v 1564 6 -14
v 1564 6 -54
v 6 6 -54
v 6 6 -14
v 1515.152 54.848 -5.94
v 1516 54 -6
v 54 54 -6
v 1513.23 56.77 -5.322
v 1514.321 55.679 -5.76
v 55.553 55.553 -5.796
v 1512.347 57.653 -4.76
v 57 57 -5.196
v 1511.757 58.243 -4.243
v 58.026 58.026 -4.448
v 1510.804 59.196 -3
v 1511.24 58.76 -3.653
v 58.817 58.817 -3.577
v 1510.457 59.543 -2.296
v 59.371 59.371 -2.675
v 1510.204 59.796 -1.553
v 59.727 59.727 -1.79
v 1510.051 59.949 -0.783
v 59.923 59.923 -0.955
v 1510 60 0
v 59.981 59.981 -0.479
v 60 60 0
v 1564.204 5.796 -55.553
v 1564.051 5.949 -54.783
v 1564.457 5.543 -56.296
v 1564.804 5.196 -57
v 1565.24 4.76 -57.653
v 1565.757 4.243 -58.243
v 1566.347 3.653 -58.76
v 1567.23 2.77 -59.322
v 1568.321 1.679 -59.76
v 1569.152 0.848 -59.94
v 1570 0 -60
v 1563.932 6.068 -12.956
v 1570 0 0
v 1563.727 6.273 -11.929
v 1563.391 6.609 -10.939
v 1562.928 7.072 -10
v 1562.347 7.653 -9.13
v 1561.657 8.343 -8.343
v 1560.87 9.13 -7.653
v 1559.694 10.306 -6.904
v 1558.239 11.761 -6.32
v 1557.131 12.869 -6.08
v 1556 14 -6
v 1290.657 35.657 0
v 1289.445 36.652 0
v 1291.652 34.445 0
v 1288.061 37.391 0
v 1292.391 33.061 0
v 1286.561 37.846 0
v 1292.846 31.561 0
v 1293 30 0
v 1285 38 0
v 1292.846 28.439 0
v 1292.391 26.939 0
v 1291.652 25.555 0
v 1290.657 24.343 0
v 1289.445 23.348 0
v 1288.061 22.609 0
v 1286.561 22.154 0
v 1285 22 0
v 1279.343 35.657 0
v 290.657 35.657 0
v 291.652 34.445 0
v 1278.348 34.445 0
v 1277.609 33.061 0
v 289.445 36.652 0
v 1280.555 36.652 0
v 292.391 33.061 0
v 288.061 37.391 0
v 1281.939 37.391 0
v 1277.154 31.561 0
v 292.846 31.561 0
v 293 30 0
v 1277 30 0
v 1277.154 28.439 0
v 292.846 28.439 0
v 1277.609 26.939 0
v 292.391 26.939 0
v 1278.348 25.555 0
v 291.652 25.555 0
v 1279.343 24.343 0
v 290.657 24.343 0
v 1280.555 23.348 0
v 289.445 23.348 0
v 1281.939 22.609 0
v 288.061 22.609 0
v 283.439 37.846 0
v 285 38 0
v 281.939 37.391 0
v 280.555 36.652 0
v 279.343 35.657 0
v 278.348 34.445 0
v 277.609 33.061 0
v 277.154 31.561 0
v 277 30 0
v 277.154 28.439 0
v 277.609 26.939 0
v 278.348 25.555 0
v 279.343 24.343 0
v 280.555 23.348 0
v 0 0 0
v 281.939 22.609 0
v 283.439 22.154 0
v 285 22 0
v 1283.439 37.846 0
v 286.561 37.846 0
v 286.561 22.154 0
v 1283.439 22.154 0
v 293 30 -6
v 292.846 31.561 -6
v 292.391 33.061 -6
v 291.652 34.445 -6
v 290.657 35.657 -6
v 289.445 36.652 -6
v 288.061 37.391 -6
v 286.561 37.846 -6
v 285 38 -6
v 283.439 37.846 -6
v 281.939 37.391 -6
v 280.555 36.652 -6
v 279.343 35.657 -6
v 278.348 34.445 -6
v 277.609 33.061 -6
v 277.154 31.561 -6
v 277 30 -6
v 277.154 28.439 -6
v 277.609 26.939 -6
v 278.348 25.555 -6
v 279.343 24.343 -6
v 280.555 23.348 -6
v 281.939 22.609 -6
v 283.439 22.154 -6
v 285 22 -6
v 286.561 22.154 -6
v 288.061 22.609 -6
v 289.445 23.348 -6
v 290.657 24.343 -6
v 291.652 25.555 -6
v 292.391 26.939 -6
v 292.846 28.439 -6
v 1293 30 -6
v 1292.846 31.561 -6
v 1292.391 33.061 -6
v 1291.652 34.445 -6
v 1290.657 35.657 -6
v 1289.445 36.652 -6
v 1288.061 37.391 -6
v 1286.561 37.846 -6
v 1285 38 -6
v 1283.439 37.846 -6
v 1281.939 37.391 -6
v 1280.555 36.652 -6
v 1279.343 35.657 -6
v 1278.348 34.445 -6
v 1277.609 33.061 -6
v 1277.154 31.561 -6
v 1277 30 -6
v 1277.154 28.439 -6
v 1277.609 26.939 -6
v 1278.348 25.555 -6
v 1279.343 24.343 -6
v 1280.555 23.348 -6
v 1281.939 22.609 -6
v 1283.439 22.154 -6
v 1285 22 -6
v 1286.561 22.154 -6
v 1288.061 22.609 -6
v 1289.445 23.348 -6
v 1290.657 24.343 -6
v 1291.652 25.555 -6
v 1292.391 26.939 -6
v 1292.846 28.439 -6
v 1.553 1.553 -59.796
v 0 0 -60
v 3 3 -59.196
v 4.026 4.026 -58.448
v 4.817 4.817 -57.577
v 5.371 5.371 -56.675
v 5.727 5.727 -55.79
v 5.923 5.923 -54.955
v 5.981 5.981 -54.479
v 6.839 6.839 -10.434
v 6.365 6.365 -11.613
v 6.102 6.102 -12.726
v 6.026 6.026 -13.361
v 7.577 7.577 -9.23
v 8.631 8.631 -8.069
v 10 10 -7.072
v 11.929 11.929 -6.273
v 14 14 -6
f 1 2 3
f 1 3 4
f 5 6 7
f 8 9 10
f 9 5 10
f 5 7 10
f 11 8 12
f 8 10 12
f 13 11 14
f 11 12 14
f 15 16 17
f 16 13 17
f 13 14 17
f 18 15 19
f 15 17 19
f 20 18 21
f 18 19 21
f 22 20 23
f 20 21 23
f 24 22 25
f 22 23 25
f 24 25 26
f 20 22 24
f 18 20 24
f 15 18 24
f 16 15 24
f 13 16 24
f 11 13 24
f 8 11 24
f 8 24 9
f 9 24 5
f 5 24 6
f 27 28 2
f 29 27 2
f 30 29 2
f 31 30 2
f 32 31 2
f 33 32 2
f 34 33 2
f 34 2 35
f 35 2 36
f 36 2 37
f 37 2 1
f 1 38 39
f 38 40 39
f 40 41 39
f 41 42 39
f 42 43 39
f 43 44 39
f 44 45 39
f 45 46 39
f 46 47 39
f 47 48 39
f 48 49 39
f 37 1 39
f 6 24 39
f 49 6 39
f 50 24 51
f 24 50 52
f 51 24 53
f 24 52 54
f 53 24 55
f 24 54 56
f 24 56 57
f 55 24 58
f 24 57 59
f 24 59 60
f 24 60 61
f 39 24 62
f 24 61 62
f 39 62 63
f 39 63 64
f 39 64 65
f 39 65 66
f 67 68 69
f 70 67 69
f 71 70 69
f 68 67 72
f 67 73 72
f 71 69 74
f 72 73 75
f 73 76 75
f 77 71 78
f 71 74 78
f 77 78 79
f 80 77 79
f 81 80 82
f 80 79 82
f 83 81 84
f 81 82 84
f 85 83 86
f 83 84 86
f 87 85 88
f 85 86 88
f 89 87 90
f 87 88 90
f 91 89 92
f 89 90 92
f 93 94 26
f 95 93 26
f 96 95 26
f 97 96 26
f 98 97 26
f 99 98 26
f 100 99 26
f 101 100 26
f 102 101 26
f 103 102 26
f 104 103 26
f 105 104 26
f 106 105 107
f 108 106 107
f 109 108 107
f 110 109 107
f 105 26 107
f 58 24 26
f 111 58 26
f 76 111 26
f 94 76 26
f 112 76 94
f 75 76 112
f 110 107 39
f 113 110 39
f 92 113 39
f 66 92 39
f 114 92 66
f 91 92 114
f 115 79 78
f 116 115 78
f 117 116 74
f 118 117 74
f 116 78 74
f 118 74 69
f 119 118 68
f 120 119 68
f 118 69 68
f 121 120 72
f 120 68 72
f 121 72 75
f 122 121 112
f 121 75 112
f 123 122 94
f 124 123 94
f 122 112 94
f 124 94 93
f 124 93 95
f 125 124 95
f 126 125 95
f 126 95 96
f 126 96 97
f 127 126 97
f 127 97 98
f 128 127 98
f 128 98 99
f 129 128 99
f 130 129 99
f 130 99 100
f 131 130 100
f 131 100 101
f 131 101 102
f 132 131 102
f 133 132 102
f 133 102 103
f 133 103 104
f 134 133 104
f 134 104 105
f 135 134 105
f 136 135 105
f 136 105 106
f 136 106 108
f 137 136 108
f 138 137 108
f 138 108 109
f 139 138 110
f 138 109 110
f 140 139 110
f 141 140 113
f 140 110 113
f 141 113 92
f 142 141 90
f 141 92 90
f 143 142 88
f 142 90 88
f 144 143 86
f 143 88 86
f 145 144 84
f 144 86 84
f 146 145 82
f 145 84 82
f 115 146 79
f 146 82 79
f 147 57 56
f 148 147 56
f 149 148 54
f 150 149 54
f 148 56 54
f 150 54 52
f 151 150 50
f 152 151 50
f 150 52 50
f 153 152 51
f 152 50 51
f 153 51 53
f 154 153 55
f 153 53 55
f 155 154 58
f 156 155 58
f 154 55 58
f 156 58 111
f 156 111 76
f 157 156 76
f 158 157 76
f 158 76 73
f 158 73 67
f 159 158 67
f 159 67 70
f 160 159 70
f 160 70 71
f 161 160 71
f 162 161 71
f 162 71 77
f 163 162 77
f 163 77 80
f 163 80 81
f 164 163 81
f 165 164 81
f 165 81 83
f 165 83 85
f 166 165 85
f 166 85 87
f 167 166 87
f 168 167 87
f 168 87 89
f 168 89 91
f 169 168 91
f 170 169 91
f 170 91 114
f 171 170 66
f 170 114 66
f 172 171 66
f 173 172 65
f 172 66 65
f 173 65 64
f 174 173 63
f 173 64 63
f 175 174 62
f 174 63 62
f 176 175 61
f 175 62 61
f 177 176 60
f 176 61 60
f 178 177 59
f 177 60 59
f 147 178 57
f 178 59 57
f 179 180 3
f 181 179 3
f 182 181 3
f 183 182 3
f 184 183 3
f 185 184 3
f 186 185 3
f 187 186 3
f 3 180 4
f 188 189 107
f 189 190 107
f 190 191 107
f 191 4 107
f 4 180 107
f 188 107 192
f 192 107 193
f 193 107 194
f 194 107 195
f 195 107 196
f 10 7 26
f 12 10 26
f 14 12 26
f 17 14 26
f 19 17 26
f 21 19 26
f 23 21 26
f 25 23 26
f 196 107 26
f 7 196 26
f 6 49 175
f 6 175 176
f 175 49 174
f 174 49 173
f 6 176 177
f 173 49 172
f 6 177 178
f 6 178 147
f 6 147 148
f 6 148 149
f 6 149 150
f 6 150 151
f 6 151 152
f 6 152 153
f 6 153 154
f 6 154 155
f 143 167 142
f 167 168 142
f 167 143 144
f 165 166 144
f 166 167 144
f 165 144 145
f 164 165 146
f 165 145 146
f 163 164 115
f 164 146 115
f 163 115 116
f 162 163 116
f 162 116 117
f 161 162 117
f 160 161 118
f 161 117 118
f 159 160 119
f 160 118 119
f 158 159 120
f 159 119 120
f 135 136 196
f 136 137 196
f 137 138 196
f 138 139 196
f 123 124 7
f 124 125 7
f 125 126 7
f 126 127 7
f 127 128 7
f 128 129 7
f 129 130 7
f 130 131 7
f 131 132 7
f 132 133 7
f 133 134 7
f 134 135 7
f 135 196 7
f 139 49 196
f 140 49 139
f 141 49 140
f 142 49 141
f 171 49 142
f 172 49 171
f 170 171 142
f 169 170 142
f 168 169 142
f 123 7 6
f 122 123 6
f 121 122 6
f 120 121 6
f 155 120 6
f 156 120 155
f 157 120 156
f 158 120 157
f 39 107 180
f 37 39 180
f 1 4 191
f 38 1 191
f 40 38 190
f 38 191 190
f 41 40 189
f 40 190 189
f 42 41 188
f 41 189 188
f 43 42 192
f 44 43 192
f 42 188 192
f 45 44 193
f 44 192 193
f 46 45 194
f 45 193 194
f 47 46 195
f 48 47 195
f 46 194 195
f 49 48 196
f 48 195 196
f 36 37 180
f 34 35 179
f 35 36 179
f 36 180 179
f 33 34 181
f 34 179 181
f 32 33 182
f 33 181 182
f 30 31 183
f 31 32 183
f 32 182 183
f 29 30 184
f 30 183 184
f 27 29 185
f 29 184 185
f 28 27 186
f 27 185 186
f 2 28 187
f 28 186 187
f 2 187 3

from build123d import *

# Parameters (mm, degrees)
L_ANGLE_EQUAL_60X60X6_3_DEPTH = 1570
SKETCH14_R                    = 8
CUT_EXTRUDE1_DEPTH            = 1573.291321607


with BuildPart() as part:
    # Sketch17 → L angle (equal) 60X60X6(3) (new body)
    with BuildSketch(Plane(origin=(0, 0, 0), x_dir=(0, 0, -1), z_dir=(1, 0, 0))):
        with BuildLine():
            Line((0, 60), (0, 0))
            Line((0, 0), (60, 0))
            ThreePointArc((60, 0), (58.242640687, 4.242640687), (54, 6))
            Line((54, 6), (14, 6))
            ThreePointArc((14, 6), (8.343145751, 8.343145751), (6, 14))
            Line((6, 14), (6, 54))
            ThreePointArc((6, 54), (4.242640687, 58.242640687), (0, 60))
        make_face()
    extrude(amount=L_ANGLE_EQUAL_60X60X6_3_DEPTH)

    # Sketch14 → Cut-Extrude1 (cut, through all)
    with BuildSketch(Plane.XY):
        with Locations((285, 30)):
            Circle(SKETCH14_R)
        with Locations((1285, 30)):
            Circle(SKETCH14_R)
        Polygon((1570, 0), (1570, 60), (1510, 60), align=None)
        Polygon((0, 60), (0, 0), (60, 60), align=None)
    extrude(amount=-CUT_EXTRUDE1_DEPTH, mode=Mode.SUBTRACT)


solid = part.part
